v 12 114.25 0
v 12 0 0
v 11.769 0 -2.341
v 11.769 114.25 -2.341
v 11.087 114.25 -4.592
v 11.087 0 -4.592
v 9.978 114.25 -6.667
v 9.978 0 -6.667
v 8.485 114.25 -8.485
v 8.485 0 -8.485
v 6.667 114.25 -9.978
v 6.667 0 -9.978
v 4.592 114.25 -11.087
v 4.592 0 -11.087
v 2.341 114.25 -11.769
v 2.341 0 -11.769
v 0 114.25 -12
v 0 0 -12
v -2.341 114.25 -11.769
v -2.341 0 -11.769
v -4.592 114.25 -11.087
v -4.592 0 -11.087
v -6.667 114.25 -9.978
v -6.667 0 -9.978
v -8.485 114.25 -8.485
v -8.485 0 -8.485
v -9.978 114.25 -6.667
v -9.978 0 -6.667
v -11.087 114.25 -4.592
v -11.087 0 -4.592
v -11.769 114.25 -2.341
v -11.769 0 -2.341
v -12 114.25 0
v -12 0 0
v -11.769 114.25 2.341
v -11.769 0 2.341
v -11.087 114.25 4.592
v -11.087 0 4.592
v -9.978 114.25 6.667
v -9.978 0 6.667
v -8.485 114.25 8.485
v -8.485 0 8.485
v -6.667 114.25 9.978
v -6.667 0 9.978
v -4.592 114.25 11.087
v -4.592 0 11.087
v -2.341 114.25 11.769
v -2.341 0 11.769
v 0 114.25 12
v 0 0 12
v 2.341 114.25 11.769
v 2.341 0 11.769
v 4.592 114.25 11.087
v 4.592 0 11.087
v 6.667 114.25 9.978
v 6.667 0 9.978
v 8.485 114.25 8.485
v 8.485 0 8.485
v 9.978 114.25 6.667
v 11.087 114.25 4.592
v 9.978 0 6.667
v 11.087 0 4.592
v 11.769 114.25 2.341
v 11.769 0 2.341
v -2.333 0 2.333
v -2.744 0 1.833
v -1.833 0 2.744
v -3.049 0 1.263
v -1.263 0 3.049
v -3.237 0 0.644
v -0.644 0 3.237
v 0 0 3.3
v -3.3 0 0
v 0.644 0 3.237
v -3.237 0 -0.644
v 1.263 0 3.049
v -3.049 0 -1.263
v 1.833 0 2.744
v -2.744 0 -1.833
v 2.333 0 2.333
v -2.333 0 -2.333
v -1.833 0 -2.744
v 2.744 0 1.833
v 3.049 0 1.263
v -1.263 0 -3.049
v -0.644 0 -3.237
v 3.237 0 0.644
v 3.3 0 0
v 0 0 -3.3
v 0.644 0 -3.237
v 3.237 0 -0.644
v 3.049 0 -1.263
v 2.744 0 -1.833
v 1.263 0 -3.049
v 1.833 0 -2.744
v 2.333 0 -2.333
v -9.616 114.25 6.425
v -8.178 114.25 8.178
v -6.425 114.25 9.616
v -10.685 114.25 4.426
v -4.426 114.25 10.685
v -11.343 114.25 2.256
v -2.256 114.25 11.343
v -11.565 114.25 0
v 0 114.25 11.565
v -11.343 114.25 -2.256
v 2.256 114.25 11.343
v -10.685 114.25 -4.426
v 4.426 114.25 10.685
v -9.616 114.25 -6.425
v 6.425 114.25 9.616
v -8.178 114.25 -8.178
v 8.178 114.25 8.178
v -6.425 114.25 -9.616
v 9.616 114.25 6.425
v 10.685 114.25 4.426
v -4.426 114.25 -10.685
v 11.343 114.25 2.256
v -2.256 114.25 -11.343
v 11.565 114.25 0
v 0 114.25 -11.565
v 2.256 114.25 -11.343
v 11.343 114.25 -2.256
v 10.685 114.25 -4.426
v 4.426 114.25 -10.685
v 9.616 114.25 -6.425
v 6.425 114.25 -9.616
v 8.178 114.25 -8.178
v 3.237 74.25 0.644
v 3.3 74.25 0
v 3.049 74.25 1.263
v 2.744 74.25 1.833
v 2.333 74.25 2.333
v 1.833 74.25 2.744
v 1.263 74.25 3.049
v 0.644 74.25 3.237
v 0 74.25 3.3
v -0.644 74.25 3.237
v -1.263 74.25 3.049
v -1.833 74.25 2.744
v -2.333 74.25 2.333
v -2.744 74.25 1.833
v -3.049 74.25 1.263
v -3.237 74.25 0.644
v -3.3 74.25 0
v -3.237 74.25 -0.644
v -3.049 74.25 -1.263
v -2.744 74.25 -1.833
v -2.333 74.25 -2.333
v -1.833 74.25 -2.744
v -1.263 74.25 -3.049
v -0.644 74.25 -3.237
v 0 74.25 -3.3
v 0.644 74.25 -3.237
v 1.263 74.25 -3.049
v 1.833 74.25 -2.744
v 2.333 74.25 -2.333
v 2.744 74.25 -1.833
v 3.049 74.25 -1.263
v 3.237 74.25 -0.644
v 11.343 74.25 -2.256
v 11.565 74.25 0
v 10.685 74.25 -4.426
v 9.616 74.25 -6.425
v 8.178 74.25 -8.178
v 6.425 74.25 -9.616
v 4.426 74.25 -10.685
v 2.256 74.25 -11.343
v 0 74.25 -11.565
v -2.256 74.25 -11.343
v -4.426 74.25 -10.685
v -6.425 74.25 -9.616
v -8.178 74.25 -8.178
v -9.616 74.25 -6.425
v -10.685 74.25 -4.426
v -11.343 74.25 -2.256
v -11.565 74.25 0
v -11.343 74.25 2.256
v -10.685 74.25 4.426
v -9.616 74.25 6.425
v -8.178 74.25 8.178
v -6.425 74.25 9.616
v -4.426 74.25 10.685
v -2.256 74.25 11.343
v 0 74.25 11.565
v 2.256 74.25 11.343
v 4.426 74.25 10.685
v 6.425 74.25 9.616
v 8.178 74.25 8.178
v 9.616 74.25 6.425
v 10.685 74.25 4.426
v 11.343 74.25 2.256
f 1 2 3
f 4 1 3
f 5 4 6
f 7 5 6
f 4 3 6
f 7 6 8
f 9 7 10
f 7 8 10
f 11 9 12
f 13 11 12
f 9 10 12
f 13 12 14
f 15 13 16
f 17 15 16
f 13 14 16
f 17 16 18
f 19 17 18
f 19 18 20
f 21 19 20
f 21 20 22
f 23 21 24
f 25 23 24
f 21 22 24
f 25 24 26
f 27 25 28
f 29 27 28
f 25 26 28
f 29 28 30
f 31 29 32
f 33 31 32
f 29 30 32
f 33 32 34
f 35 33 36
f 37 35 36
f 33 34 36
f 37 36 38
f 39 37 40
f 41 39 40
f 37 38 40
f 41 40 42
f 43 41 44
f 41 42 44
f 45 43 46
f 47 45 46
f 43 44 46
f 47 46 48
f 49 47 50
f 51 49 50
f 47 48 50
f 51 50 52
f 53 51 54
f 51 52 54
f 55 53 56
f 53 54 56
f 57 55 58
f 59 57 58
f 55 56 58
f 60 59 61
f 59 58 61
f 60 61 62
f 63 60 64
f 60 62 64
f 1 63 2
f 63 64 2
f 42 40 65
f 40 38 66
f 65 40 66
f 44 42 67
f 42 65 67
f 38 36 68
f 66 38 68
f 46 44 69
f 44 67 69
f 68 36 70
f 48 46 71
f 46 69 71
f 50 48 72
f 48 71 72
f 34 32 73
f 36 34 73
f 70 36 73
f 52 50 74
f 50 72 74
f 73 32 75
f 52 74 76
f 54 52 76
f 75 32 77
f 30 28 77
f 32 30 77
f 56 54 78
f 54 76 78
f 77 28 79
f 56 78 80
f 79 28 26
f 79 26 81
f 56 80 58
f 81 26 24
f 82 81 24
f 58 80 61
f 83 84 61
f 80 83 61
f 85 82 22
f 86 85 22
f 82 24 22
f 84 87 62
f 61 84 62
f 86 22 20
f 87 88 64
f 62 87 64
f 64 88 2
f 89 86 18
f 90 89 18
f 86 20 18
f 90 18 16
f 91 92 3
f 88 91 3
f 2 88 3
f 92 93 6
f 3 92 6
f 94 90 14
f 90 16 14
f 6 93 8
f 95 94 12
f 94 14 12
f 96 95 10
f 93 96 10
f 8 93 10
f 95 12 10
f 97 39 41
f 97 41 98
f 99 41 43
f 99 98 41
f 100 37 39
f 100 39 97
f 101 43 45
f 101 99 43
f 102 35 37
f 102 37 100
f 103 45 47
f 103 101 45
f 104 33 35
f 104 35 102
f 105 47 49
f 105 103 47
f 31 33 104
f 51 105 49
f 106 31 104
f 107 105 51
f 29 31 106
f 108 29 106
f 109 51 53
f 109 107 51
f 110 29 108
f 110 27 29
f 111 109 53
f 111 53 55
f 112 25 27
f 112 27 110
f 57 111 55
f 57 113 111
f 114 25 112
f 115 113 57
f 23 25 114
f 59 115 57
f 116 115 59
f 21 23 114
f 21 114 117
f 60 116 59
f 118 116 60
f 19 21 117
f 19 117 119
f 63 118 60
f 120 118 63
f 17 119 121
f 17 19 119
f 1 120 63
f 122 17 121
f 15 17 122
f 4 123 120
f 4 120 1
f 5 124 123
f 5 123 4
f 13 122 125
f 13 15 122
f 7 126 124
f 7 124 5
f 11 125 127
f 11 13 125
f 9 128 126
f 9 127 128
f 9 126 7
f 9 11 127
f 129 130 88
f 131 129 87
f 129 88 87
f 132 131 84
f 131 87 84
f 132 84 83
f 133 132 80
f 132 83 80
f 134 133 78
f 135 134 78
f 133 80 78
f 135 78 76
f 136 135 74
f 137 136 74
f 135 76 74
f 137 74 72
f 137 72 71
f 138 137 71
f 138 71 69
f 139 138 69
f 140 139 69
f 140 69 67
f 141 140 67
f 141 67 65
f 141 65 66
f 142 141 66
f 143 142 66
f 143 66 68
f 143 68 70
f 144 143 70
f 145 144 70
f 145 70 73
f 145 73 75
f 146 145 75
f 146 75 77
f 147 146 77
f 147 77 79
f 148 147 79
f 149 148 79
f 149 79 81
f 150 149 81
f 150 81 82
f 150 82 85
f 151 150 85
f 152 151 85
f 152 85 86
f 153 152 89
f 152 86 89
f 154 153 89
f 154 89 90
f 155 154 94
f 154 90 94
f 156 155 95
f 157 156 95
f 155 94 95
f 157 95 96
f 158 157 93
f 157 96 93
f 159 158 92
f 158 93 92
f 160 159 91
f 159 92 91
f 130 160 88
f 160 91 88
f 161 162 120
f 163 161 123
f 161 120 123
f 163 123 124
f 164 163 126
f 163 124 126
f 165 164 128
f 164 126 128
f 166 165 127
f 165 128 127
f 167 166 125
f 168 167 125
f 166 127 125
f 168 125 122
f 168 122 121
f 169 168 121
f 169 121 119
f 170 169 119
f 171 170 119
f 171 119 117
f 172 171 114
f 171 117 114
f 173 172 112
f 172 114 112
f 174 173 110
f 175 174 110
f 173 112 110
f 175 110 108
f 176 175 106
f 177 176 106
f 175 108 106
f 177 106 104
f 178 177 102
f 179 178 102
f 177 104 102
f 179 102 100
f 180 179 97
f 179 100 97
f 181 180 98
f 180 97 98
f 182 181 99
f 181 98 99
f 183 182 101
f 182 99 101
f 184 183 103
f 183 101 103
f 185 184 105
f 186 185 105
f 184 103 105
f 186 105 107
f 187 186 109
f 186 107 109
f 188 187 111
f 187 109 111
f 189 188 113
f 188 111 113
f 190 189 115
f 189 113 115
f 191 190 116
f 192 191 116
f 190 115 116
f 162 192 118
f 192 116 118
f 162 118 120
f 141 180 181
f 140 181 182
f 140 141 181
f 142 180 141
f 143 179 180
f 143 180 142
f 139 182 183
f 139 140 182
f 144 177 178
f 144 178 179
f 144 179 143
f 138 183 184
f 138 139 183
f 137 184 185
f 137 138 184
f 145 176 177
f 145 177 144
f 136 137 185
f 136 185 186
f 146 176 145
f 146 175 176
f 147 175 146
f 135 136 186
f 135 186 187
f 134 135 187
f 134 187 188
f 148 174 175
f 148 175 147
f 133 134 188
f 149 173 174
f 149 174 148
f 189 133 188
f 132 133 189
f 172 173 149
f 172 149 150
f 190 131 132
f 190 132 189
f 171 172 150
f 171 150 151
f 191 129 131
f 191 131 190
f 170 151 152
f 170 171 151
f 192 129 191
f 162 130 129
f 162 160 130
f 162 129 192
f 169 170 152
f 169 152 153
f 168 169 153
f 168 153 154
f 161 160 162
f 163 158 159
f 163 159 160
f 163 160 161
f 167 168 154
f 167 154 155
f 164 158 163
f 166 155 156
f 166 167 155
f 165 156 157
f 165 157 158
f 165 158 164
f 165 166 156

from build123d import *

# Parameters (mm, degrees)
SKETCH1_R               = 12
BOSS_EXTRUDE1_DEPTH     = 114.25
SKETCH2_R               = 11.565
CUT_EXTRUDE1_DEPTH      = 40
SKETCH3_R               = 3.3
CUT_EXTRUDE2_DEPTH      = 1
CUT_EXTRUDE2_DEPTH_BACK = 115.25


with BuildPart() as part:
    # Sketch1 → Boss-Extrude1 (new body)
    with BuildSketch(Plane(origin=(0, 0, 0), x_dir=(1, 0, 0), z_dir=(0, 1, 0))):
        Circle(SKETCH1_R)
    extrude(amount=BOSS_EXTRUDE1_DEPTH)

    # Sketch2 → Cut-Extrude1 (cut)
    with BuildSketch(Plane(origin=(0, 114.25, 0), x_dir=(1, 0, 0), z_dir=(0, 1, 0))):
        Circle(SKETCH2_R)
    extrude(amount=-CUT_EXTRUDE1_DEPTH, mode=Mode.SUBTRACT)

    # Sketch3 → Cut-Extrude2 (cut, two sides)
    with BuildSketch(Plane.XZ) as cut_extrude2_sk:
        Circle(SKETCH3_R)
    extrude(amount=CUT_EXTRUDE2_DEPTH, mode=Mode.SUBTRACT)
    extrude(cut_extrude2_sk.sketch, amount=-CUT_EXTRUDE2_DEPTH_BACK, mode=Mode.SUBTRACT)


solid = part.part
